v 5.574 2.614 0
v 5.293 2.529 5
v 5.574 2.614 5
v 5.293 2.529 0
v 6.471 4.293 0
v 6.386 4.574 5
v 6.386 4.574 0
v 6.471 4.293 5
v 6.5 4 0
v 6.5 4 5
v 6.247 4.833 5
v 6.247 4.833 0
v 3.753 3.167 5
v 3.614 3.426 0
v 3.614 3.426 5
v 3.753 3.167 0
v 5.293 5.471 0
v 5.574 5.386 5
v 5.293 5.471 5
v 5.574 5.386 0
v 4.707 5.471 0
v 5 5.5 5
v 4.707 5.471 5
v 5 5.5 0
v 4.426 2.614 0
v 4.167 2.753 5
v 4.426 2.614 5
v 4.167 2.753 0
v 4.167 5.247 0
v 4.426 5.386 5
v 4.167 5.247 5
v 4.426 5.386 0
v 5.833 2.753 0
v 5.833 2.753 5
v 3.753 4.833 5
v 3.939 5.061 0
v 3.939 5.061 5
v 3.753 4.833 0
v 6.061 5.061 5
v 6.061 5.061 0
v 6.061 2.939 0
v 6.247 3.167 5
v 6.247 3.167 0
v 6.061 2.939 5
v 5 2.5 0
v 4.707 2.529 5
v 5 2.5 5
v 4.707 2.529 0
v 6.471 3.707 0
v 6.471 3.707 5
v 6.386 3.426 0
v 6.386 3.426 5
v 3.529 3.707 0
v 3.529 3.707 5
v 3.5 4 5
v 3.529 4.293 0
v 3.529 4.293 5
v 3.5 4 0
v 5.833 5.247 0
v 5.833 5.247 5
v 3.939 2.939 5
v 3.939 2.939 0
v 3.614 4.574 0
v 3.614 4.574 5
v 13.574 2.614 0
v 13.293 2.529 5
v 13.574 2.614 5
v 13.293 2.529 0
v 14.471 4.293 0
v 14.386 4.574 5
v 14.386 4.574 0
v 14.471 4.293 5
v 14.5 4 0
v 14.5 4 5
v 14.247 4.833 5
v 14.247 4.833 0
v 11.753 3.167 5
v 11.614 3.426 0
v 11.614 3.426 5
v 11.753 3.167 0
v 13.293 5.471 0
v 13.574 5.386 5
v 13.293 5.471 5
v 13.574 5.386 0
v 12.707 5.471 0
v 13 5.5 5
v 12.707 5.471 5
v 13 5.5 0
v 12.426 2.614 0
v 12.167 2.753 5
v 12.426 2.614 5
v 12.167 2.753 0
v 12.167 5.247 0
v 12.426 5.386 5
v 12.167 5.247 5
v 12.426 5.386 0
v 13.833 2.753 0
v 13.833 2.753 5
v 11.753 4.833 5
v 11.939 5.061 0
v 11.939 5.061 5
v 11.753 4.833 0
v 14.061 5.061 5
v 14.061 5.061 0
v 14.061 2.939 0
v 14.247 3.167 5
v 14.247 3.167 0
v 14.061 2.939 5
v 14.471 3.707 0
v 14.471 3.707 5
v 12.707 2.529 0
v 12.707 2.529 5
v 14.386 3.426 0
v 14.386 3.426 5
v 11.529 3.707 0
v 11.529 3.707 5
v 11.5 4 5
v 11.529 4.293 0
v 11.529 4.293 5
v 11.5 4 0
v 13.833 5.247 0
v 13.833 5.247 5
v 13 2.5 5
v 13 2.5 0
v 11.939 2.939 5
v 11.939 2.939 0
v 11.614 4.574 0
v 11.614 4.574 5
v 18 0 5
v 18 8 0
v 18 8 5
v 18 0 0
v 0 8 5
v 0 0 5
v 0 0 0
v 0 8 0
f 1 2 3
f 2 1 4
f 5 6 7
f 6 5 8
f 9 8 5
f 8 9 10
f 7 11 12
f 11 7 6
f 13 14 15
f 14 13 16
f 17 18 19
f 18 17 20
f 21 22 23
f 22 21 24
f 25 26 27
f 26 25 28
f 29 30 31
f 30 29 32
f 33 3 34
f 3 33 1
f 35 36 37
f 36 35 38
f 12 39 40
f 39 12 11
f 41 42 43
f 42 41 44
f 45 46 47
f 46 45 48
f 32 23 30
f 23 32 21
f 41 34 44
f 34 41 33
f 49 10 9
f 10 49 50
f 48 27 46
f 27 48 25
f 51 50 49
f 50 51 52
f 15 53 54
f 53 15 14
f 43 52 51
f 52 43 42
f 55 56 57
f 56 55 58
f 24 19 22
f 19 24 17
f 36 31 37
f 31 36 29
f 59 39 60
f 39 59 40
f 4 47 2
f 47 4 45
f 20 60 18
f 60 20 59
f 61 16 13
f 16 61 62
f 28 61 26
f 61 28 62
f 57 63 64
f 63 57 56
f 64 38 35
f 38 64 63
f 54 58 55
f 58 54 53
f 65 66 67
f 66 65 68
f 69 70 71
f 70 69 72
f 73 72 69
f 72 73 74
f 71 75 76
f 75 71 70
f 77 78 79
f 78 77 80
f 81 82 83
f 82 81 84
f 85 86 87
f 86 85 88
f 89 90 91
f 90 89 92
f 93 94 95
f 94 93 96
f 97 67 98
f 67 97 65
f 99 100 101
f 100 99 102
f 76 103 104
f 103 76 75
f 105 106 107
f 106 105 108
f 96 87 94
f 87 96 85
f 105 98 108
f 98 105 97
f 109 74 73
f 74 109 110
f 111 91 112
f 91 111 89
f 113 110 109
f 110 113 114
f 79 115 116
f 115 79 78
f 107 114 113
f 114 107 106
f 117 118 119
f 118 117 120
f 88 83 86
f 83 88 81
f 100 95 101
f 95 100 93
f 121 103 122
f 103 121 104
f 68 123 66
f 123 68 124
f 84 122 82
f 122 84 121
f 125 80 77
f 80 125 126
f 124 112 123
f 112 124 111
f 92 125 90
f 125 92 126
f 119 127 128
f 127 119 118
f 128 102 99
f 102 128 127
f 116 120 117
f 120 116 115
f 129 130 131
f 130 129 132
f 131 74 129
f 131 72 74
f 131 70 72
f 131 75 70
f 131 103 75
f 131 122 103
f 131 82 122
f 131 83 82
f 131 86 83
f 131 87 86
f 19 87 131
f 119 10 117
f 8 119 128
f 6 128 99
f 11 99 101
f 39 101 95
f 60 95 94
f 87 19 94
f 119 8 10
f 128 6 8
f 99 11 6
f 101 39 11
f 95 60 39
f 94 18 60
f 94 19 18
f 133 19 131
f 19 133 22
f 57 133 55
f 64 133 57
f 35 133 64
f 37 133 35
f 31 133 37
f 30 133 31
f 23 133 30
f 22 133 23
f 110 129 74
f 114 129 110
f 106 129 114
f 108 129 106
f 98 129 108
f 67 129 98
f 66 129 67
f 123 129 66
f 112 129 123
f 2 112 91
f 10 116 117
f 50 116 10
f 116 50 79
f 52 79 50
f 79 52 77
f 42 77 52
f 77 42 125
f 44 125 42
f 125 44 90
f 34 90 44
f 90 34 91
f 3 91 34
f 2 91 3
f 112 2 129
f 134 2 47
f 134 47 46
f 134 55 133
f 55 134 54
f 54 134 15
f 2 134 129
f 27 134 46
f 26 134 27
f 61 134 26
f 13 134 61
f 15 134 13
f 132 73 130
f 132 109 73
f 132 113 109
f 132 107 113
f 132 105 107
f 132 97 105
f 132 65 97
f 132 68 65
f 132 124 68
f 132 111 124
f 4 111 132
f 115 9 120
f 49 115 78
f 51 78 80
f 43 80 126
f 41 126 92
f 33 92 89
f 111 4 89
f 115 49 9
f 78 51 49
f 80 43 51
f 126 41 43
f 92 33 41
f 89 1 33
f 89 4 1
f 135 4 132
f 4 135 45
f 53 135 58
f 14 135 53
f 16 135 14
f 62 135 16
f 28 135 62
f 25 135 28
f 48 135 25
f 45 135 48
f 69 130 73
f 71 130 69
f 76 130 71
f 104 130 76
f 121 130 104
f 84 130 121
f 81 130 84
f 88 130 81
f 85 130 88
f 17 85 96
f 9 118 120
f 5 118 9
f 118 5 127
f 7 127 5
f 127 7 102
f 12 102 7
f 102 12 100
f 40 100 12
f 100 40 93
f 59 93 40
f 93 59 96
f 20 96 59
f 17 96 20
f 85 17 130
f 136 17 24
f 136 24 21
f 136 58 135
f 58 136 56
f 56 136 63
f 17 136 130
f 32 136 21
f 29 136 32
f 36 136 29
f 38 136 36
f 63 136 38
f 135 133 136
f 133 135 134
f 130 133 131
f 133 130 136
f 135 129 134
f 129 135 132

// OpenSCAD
$fn = 32;

// ----------------------------------------------------------------------
// Micro pad: two-hole pad, 5-20 mm class
// ----------------------------------------------------------------------

// --- parameters (mm) ---
pad_l = 18;               // pad length, X
pad_w = 8;                // pad width, Y
pad_t = 5;                // pad thickness, Z
hole_d = 3;               // hole diameter
hole_x = 5;               // X of the first hole centre

difference() {
  cube([pad_l, pad_w, pad_t]);
  for (x = [hole_x, pad_l - hole_x])
    translate([x, pad_w / 2, -1])
      cylinder(h = pad_t + 2, d = hole_d);
}
